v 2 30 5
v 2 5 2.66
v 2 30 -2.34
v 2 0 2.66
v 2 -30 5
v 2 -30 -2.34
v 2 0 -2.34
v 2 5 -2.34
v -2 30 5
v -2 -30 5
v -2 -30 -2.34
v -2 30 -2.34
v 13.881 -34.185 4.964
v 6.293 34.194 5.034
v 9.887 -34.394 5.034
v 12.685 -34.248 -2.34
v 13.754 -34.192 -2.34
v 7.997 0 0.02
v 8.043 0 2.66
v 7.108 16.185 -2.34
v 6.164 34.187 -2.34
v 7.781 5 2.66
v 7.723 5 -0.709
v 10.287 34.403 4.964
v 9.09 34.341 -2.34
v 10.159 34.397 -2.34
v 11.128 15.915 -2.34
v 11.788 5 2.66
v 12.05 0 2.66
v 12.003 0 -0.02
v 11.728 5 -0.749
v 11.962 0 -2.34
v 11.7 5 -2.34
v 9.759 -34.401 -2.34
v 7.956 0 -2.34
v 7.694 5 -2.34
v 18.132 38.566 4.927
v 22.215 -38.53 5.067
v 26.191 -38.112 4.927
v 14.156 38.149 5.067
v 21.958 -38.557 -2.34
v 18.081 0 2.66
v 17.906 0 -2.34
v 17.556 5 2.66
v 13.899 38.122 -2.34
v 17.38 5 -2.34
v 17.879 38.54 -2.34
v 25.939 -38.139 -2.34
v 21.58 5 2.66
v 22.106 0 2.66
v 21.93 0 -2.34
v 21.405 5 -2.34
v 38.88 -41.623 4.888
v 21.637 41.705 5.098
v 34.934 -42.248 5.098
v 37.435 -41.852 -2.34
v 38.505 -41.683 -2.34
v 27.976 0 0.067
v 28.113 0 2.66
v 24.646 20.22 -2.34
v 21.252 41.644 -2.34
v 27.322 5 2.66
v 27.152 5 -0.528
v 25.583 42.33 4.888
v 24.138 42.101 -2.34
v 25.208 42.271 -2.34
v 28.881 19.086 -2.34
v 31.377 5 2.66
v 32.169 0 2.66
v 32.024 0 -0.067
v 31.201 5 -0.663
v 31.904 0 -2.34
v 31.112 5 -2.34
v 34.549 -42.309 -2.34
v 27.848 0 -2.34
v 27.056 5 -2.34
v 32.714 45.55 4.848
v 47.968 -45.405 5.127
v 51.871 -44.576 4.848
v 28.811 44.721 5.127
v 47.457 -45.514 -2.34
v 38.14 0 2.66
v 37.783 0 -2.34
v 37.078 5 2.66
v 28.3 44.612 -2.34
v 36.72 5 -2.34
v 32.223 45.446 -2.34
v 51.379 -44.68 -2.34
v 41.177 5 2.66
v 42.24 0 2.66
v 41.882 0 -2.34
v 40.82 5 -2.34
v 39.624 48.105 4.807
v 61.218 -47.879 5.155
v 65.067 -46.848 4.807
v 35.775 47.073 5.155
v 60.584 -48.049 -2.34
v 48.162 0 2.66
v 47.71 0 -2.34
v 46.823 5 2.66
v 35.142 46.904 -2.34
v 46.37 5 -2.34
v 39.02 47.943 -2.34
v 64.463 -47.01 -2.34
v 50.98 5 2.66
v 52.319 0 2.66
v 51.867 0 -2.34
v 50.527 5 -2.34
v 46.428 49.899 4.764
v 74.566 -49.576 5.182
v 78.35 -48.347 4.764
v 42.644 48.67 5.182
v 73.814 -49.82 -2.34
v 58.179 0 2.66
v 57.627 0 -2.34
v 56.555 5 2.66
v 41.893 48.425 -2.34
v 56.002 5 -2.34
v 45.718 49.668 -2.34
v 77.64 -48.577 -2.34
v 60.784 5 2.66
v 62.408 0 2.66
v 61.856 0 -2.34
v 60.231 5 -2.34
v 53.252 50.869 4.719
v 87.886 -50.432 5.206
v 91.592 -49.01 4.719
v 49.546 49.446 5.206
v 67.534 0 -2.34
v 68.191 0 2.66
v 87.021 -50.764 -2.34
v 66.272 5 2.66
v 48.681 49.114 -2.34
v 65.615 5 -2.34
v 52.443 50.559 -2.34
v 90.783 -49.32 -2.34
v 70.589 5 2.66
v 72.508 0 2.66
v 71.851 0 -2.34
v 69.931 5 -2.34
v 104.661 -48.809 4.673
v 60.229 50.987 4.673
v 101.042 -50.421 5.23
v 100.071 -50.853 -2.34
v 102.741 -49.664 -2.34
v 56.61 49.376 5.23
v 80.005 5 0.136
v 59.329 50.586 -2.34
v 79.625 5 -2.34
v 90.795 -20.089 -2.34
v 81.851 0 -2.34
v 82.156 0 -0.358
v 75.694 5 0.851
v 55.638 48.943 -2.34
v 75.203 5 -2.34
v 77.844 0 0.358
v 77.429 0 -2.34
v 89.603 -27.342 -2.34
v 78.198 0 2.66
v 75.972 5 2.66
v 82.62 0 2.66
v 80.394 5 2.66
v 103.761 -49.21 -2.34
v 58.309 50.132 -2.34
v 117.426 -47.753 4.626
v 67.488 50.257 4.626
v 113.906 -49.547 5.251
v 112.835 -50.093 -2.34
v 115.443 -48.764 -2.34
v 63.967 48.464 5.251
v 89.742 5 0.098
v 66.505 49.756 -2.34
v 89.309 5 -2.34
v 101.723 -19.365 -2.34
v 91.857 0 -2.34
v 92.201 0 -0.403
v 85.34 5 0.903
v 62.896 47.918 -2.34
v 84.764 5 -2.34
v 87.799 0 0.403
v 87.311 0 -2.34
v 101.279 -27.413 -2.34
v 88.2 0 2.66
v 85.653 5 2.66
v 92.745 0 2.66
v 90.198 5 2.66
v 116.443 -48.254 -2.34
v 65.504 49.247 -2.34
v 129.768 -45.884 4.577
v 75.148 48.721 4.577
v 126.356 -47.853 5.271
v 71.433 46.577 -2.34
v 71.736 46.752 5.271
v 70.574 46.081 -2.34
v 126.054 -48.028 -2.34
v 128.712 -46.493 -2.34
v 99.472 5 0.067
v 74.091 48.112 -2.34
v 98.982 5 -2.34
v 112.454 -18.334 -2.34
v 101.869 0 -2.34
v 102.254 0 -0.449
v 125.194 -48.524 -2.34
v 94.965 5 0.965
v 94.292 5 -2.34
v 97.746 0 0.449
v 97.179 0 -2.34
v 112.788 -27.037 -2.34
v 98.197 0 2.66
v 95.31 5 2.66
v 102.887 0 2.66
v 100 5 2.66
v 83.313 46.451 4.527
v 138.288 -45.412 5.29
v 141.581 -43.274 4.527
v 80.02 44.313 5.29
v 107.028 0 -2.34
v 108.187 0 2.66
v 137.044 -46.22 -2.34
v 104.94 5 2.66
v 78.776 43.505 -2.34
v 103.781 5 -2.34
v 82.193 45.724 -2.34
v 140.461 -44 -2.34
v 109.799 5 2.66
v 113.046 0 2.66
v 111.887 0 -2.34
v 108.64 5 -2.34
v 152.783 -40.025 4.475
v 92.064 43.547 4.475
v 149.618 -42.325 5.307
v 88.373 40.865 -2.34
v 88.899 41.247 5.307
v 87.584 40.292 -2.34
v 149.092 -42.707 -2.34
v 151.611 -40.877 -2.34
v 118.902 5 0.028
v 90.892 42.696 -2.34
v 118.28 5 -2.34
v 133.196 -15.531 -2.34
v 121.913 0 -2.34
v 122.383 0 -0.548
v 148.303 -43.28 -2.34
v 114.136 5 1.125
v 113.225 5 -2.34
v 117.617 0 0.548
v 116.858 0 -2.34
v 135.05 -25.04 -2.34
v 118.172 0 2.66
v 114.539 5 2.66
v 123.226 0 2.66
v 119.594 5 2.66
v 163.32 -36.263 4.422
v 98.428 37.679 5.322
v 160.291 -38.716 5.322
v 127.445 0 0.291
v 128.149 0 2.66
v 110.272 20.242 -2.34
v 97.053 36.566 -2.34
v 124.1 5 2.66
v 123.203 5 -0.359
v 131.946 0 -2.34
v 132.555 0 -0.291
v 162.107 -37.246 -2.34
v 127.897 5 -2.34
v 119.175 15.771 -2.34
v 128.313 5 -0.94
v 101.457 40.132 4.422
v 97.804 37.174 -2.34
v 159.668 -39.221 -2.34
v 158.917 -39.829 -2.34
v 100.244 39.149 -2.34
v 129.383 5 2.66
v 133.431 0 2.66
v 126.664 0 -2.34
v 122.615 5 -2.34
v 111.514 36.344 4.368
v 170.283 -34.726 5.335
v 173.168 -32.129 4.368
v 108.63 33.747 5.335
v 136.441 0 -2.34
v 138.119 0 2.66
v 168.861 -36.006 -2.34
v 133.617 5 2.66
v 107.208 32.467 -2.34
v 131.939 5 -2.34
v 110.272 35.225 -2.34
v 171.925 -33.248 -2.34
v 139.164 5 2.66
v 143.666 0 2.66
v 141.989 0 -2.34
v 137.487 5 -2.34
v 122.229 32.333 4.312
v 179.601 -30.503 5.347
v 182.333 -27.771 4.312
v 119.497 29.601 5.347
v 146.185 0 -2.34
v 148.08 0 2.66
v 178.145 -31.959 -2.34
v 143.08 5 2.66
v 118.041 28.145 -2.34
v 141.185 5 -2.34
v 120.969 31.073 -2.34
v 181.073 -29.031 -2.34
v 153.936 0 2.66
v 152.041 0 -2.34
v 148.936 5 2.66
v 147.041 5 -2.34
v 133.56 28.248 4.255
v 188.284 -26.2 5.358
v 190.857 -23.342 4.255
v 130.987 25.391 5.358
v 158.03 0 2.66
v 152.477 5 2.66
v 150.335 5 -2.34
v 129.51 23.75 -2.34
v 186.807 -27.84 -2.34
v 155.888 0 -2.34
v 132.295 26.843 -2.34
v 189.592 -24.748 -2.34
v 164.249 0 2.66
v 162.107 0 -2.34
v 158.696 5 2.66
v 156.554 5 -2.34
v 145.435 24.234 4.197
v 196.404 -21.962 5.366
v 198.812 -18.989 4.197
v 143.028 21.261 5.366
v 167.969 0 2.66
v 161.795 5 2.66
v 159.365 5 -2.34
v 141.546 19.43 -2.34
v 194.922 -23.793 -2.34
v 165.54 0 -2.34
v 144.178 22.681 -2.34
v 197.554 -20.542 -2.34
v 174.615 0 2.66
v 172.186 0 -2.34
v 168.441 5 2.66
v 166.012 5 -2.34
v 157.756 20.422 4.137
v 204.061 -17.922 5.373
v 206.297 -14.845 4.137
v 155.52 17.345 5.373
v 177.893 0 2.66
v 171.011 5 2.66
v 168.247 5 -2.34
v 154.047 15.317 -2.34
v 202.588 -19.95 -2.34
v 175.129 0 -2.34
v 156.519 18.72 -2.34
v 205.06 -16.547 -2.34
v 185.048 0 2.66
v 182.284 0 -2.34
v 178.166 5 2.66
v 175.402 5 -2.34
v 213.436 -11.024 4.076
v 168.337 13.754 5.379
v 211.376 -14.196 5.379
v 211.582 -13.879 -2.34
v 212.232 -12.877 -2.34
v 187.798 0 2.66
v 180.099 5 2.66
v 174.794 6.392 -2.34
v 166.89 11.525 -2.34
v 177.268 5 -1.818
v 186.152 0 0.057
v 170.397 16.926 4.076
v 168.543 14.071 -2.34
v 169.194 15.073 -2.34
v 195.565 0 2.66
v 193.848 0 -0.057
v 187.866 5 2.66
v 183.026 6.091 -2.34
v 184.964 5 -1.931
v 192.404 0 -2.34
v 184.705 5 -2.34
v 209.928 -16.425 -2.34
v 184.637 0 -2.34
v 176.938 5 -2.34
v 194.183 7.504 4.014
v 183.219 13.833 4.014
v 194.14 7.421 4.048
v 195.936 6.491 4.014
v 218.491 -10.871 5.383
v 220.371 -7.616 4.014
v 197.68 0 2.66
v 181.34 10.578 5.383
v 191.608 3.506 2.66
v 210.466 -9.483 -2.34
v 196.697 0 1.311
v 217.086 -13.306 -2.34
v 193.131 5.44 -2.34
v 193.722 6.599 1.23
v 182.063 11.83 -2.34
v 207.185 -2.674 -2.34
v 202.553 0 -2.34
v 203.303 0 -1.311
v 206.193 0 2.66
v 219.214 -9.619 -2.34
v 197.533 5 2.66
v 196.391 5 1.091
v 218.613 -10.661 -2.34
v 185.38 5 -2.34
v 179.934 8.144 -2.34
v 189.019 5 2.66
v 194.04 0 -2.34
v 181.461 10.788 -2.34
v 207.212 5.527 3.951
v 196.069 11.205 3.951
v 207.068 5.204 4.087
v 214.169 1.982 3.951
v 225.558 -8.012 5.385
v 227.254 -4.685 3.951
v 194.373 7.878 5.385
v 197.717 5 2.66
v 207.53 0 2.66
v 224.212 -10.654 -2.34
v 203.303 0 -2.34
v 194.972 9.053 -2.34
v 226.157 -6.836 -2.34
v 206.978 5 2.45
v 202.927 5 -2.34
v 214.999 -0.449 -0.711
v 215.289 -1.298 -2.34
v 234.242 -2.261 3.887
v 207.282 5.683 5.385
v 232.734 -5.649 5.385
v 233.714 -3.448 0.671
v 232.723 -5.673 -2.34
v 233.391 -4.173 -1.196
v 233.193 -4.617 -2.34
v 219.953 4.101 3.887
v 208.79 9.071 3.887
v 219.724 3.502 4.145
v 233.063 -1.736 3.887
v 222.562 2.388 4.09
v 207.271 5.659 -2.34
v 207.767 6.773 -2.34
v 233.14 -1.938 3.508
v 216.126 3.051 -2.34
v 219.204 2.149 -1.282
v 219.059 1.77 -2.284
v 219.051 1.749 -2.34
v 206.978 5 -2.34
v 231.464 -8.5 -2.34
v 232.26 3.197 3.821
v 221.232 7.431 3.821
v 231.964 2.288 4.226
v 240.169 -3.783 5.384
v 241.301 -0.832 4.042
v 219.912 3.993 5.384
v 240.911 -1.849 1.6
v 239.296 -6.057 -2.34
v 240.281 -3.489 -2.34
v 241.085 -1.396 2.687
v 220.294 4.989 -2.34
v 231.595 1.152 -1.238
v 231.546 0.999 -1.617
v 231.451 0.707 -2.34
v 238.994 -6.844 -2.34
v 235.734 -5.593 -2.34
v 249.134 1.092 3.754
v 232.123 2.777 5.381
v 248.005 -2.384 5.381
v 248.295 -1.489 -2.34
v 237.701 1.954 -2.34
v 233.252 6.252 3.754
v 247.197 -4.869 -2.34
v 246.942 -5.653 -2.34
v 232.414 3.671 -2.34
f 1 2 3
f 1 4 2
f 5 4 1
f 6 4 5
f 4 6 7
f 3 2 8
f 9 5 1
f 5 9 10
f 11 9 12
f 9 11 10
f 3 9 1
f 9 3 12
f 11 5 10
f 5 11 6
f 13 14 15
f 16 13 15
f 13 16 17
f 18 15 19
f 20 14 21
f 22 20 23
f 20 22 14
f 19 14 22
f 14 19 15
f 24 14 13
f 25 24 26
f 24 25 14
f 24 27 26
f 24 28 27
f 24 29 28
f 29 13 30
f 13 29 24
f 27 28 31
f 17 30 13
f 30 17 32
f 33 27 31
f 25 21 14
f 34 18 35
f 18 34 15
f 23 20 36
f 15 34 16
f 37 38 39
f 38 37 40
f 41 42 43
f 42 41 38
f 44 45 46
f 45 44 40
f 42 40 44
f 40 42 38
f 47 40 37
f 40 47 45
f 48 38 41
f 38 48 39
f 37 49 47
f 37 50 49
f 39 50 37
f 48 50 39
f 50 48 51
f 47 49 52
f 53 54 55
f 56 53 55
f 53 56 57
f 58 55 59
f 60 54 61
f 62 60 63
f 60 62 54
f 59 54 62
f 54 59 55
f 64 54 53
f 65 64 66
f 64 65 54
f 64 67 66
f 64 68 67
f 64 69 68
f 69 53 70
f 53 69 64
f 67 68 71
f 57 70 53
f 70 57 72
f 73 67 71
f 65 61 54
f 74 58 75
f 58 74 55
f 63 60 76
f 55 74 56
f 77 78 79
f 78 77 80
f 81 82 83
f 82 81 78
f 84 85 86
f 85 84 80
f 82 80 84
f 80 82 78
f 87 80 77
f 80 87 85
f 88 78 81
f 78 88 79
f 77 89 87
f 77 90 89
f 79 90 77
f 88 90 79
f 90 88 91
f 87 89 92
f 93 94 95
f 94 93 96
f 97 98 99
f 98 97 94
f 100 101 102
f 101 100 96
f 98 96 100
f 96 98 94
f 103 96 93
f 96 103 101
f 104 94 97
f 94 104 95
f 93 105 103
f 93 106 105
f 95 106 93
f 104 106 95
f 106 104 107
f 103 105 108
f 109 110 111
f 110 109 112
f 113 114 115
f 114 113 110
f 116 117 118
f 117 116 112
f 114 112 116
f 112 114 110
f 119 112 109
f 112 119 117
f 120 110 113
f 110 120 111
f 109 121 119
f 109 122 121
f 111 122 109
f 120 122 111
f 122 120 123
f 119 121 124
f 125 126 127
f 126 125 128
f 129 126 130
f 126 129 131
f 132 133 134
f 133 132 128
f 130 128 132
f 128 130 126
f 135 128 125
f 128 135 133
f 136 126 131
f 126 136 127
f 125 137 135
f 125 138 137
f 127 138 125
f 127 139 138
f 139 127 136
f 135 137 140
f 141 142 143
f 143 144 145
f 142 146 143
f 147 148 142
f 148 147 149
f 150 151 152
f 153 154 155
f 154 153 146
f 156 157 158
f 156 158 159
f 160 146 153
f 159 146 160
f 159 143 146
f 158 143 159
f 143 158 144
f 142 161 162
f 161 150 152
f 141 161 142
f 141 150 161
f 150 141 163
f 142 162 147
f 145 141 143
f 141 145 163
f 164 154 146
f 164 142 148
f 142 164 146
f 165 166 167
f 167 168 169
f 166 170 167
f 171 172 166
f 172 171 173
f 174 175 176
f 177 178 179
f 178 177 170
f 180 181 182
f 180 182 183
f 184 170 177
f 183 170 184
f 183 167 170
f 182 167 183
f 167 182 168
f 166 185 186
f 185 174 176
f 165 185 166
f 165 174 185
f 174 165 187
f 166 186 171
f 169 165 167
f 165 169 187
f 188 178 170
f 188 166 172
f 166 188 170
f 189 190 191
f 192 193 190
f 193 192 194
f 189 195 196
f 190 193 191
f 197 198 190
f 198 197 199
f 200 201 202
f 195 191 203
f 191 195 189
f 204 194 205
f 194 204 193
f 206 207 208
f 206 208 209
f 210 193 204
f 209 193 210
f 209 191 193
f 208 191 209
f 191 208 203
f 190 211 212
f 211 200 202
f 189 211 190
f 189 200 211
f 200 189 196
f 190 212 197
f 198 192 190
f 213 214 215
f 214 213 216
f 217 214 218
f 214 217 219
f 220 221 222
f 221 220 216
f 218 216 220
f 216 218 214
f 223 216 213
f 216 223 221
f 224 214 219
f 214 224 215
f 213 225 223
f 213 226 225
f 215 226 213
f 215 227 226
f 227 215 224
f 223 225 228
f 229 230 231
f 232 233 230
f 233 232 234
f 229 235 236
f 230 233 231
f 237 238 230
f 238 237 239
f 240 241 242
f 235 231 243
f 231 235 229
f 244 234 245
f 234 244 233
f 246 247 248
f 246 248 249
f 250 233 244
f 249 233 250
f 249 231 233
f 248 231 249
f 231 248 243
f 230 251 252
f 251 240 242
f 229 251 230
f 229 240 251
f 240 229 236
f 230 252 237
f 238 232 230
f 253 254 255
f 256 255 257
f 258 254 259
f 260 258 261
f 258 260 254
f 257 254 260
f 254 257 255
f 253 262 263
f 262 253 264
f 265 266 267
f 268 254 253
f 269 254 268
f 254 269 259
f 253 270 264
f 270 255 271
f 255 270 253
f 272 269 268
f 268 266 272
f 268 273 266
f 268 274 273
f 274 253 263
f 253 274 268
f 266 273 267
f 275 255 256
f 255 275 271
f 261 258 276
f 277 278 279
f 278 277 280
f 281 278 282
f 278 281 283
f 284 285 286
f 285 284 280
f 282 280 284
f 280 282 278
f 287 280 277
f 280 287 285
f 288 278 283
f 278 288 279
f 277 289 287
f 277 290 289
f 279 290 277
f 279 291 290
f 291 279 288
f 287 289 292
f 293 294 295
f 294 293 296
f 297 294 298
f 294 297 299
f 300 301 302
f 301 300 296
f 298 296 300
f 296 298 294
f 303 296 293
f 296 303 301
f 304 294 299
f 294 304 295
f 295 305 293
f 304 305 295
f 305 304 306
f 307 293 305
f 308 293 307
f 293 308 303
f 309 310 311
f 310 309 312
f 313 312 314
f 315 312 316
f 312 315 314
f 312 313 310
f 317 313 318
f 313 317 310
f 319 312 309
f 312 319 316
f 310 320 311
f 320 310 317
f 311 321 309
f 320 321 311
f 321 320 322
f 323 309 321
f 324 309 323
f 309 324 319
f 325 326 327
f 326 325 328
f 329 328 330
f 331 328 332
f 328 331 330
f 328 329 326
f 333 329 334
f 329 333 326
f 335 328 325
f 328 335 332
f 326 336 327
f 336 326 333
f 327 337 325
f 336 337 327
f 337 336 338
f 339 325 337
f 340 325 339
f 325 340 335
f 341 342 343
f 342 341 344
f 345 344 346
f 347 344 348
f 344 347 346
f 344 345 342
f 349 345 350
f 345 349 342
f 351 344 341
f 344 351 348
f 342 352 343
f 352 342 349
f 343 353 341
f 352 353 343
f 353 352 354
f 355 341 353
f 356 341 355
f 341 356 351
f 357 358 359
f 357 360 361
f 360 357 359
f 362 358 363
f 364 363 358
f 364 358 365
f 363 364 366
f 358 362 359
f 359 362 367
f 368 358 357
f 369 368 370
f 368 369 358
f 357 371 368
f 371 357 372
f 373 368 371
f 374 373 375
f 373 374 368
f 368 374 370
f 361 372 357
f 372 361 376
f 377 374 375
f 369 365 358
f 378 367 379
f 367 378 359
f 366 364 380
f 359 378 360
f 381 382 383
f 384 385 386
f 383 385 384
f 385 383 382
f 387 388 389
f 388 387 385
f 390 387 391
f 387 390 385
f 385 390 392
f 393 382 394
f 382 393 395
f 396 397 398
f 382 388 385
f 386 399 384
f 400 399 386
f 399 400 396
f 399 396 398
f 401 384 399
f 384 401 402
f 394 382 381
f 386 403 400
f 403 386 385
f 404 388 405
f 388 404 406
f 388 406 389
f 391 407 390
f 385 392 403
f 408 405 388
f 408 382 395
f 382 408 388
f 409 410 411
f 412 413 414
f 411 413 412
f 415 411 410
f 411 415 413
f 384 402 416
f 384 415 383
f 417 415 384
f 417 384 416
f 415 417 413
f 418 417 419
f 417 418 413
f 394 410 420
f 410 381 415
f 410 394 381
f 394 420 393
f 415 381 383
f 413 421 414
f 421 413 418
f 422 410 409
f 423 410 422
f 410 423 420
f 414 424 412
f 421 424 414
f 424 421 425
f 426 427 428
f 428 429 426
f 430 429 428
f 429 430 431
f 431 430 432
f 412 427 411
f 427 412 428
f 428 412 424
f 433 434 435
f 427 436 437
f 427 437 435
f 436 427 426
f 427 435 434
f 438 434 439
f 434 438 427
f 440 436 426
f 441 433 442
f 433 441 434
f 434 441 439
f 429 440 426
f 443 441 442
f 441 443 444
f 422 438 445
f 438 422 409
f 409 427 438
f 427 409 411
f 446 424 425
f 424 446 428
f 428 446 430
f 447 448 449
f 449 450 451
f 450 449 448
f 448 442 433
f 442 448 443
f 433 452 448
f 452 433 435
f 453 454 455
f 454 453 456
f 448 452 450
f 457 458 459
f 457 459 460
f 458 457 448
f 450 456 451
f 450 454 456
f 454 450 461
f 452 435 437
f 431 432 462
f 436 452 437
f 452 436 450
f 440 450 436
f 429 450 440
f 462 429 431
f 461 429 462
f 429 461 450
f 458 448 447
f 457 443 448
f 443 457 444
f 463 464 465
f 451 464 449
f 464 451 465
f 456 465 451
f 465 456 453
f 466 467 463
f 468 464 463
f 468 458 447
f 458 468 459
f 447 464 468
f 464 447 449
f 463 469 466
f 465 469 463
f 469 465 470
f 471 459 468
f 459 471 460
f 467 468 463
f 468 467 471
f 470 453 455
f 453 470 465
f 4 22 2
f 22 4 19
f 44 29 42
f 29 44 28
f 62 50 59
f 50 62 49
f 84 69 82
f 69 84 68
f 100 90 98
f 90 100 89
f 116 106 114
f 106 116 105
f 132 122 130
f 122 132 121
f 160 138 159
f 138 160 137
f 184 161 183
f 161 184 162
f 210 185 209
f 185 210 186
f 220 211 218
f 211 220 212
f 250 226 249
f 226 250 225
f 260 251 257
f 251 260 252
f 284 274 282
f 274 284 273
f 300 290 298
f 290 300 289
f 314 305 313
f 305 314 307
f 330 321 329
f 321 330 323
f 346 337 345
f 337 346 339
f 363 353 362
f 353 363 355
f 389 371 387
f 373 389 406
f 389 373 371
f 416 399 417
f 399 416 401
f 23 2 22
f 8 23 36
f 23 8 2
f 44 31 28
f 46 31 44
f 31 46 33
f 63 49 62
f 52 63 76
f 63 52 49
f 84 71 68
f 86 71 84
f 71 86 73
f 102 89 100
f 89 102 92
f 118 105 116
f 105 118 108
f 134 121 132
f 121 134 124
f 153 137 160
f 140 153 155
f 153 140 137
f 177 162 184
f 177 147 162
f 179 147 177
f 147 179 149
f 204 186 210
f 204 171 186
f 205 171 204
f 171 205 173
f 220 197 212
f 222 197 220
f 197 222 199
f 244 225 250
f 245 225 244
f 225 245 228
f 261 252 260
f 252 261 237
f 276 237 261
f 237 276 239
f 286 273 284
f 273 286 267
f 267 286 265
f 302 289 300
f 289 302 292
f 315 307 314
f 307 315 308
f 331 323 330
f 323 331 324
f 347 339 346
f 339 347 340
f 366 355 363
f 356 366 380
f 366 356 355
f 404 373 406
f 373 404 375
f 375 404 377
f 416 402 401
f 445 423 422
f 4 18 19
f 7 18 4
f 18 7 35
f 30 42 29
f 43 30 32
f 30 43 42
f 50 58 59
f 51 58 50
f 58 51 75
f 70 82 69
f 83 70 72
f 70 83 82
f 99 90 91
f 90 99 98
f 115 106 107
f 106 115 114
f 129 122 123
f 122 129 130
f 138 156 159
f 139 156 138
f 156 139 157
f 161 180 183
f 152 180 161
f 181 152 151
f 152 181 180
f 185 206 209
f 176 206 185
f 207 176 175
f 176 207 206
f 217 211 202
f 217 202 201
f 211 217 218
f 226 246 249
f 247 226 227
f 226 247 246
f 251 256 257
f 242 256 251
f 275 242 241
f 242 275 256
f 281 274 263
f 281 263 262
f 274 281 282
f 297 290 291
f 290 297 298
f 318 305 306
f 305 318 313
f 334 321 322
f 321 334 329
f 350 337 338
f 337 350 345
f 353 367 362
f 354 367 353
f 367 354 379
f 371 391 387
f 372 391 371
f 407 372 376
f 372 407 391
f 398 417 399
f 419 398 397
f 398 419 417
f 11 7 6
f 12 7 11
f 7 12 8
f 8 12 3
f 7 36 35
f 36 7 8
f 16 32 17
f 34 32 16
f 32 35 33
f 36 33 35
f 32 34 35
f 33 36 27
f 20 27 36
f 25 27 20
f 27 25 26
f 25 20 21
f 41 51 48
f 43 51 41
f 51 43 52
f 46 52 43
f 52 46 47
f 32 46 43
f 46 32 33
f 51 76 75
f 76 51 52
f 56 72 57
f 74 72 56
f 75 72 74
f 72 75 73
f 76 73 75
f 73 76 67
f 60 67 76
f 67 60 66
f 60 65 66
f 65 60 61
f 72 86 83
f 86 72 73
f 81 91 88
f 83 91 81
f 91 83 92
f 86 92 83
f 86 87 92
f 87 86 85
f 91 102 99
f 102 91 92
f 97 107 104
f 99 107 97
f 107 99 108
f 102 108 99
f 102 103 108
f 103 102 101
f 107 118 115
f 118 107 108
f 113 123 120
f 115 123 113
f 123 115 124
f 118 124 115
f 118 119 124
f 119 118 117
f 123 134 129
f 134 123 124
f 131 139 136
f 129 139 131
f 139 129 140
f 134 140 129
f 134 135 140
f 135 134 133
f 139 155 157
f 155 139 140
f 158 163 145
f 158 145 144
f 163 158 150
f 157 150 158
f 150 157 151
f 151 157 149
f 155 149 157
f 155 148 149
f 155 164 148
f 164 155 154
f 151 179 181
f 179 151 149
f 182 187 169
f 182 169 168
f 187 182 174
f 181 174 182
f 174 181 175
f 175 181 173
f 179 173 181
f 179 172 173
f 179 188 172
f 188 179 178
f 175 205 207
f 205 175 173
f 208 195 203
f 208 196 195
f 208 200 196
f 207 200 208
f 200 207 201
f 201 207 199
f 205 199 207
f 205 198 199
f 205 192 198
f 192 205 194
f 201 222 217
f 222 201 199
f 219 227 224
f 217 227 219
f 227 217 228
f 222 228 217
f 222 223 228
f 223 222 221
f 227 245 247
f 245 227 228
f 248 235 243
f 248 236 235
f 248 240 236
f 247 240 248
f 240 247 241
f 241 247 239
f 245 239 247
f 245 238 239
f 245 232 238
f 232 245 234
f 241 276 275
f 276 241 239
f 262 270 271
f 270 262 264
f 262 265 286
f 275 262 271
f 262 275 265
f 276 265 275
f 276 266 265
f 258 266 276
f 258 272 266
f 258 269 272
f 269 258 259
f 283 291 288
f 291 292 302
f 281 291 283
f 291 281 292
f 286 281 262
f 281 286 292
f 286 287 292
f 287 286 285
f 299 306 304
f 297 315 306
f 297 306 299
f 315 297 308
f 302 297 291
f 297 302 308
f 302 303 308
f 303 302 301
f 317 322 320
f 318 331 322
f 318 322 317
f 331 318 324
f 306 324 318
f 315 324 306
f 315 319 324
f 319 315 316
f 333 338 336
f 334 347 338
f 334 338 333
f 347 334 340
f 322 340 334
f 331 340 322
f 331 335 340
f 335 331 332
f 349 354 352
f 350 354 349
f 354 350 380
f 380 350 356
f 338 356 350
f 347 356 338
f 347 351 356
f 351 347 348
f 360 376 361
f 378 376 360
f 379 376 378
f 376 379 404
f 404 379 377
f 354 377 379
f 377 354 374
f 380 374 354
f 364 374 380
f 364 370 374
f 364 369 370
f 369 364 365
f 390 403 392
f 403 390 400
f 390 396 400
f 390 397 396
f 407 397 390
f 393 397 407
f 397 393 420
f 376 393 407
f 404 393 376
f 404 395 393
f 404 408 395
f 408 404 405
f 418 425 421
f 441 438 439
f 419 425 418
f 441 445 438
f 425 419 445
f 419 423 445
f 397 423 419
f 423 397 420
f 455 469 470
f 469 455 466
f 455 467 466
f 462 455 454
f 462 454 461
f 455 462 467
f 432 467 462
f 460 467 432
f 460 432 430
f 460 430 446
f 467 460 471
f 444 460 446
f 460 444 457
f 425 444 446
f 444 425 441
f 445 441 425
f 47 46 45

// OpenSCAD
 difference() {
     union() {
         
         translate([0,0,-5.34]) cube([210, 5, 8], false);
         
         for(i=[0:24])
            translate([i*10,0,0])
                rotate([0, i, i*3])
                    cube([4,sin(i*10)*50+60, 10], true);

    }
    
    translate([0,0,-4.34]) cube([500, 500, 4], true);
}
